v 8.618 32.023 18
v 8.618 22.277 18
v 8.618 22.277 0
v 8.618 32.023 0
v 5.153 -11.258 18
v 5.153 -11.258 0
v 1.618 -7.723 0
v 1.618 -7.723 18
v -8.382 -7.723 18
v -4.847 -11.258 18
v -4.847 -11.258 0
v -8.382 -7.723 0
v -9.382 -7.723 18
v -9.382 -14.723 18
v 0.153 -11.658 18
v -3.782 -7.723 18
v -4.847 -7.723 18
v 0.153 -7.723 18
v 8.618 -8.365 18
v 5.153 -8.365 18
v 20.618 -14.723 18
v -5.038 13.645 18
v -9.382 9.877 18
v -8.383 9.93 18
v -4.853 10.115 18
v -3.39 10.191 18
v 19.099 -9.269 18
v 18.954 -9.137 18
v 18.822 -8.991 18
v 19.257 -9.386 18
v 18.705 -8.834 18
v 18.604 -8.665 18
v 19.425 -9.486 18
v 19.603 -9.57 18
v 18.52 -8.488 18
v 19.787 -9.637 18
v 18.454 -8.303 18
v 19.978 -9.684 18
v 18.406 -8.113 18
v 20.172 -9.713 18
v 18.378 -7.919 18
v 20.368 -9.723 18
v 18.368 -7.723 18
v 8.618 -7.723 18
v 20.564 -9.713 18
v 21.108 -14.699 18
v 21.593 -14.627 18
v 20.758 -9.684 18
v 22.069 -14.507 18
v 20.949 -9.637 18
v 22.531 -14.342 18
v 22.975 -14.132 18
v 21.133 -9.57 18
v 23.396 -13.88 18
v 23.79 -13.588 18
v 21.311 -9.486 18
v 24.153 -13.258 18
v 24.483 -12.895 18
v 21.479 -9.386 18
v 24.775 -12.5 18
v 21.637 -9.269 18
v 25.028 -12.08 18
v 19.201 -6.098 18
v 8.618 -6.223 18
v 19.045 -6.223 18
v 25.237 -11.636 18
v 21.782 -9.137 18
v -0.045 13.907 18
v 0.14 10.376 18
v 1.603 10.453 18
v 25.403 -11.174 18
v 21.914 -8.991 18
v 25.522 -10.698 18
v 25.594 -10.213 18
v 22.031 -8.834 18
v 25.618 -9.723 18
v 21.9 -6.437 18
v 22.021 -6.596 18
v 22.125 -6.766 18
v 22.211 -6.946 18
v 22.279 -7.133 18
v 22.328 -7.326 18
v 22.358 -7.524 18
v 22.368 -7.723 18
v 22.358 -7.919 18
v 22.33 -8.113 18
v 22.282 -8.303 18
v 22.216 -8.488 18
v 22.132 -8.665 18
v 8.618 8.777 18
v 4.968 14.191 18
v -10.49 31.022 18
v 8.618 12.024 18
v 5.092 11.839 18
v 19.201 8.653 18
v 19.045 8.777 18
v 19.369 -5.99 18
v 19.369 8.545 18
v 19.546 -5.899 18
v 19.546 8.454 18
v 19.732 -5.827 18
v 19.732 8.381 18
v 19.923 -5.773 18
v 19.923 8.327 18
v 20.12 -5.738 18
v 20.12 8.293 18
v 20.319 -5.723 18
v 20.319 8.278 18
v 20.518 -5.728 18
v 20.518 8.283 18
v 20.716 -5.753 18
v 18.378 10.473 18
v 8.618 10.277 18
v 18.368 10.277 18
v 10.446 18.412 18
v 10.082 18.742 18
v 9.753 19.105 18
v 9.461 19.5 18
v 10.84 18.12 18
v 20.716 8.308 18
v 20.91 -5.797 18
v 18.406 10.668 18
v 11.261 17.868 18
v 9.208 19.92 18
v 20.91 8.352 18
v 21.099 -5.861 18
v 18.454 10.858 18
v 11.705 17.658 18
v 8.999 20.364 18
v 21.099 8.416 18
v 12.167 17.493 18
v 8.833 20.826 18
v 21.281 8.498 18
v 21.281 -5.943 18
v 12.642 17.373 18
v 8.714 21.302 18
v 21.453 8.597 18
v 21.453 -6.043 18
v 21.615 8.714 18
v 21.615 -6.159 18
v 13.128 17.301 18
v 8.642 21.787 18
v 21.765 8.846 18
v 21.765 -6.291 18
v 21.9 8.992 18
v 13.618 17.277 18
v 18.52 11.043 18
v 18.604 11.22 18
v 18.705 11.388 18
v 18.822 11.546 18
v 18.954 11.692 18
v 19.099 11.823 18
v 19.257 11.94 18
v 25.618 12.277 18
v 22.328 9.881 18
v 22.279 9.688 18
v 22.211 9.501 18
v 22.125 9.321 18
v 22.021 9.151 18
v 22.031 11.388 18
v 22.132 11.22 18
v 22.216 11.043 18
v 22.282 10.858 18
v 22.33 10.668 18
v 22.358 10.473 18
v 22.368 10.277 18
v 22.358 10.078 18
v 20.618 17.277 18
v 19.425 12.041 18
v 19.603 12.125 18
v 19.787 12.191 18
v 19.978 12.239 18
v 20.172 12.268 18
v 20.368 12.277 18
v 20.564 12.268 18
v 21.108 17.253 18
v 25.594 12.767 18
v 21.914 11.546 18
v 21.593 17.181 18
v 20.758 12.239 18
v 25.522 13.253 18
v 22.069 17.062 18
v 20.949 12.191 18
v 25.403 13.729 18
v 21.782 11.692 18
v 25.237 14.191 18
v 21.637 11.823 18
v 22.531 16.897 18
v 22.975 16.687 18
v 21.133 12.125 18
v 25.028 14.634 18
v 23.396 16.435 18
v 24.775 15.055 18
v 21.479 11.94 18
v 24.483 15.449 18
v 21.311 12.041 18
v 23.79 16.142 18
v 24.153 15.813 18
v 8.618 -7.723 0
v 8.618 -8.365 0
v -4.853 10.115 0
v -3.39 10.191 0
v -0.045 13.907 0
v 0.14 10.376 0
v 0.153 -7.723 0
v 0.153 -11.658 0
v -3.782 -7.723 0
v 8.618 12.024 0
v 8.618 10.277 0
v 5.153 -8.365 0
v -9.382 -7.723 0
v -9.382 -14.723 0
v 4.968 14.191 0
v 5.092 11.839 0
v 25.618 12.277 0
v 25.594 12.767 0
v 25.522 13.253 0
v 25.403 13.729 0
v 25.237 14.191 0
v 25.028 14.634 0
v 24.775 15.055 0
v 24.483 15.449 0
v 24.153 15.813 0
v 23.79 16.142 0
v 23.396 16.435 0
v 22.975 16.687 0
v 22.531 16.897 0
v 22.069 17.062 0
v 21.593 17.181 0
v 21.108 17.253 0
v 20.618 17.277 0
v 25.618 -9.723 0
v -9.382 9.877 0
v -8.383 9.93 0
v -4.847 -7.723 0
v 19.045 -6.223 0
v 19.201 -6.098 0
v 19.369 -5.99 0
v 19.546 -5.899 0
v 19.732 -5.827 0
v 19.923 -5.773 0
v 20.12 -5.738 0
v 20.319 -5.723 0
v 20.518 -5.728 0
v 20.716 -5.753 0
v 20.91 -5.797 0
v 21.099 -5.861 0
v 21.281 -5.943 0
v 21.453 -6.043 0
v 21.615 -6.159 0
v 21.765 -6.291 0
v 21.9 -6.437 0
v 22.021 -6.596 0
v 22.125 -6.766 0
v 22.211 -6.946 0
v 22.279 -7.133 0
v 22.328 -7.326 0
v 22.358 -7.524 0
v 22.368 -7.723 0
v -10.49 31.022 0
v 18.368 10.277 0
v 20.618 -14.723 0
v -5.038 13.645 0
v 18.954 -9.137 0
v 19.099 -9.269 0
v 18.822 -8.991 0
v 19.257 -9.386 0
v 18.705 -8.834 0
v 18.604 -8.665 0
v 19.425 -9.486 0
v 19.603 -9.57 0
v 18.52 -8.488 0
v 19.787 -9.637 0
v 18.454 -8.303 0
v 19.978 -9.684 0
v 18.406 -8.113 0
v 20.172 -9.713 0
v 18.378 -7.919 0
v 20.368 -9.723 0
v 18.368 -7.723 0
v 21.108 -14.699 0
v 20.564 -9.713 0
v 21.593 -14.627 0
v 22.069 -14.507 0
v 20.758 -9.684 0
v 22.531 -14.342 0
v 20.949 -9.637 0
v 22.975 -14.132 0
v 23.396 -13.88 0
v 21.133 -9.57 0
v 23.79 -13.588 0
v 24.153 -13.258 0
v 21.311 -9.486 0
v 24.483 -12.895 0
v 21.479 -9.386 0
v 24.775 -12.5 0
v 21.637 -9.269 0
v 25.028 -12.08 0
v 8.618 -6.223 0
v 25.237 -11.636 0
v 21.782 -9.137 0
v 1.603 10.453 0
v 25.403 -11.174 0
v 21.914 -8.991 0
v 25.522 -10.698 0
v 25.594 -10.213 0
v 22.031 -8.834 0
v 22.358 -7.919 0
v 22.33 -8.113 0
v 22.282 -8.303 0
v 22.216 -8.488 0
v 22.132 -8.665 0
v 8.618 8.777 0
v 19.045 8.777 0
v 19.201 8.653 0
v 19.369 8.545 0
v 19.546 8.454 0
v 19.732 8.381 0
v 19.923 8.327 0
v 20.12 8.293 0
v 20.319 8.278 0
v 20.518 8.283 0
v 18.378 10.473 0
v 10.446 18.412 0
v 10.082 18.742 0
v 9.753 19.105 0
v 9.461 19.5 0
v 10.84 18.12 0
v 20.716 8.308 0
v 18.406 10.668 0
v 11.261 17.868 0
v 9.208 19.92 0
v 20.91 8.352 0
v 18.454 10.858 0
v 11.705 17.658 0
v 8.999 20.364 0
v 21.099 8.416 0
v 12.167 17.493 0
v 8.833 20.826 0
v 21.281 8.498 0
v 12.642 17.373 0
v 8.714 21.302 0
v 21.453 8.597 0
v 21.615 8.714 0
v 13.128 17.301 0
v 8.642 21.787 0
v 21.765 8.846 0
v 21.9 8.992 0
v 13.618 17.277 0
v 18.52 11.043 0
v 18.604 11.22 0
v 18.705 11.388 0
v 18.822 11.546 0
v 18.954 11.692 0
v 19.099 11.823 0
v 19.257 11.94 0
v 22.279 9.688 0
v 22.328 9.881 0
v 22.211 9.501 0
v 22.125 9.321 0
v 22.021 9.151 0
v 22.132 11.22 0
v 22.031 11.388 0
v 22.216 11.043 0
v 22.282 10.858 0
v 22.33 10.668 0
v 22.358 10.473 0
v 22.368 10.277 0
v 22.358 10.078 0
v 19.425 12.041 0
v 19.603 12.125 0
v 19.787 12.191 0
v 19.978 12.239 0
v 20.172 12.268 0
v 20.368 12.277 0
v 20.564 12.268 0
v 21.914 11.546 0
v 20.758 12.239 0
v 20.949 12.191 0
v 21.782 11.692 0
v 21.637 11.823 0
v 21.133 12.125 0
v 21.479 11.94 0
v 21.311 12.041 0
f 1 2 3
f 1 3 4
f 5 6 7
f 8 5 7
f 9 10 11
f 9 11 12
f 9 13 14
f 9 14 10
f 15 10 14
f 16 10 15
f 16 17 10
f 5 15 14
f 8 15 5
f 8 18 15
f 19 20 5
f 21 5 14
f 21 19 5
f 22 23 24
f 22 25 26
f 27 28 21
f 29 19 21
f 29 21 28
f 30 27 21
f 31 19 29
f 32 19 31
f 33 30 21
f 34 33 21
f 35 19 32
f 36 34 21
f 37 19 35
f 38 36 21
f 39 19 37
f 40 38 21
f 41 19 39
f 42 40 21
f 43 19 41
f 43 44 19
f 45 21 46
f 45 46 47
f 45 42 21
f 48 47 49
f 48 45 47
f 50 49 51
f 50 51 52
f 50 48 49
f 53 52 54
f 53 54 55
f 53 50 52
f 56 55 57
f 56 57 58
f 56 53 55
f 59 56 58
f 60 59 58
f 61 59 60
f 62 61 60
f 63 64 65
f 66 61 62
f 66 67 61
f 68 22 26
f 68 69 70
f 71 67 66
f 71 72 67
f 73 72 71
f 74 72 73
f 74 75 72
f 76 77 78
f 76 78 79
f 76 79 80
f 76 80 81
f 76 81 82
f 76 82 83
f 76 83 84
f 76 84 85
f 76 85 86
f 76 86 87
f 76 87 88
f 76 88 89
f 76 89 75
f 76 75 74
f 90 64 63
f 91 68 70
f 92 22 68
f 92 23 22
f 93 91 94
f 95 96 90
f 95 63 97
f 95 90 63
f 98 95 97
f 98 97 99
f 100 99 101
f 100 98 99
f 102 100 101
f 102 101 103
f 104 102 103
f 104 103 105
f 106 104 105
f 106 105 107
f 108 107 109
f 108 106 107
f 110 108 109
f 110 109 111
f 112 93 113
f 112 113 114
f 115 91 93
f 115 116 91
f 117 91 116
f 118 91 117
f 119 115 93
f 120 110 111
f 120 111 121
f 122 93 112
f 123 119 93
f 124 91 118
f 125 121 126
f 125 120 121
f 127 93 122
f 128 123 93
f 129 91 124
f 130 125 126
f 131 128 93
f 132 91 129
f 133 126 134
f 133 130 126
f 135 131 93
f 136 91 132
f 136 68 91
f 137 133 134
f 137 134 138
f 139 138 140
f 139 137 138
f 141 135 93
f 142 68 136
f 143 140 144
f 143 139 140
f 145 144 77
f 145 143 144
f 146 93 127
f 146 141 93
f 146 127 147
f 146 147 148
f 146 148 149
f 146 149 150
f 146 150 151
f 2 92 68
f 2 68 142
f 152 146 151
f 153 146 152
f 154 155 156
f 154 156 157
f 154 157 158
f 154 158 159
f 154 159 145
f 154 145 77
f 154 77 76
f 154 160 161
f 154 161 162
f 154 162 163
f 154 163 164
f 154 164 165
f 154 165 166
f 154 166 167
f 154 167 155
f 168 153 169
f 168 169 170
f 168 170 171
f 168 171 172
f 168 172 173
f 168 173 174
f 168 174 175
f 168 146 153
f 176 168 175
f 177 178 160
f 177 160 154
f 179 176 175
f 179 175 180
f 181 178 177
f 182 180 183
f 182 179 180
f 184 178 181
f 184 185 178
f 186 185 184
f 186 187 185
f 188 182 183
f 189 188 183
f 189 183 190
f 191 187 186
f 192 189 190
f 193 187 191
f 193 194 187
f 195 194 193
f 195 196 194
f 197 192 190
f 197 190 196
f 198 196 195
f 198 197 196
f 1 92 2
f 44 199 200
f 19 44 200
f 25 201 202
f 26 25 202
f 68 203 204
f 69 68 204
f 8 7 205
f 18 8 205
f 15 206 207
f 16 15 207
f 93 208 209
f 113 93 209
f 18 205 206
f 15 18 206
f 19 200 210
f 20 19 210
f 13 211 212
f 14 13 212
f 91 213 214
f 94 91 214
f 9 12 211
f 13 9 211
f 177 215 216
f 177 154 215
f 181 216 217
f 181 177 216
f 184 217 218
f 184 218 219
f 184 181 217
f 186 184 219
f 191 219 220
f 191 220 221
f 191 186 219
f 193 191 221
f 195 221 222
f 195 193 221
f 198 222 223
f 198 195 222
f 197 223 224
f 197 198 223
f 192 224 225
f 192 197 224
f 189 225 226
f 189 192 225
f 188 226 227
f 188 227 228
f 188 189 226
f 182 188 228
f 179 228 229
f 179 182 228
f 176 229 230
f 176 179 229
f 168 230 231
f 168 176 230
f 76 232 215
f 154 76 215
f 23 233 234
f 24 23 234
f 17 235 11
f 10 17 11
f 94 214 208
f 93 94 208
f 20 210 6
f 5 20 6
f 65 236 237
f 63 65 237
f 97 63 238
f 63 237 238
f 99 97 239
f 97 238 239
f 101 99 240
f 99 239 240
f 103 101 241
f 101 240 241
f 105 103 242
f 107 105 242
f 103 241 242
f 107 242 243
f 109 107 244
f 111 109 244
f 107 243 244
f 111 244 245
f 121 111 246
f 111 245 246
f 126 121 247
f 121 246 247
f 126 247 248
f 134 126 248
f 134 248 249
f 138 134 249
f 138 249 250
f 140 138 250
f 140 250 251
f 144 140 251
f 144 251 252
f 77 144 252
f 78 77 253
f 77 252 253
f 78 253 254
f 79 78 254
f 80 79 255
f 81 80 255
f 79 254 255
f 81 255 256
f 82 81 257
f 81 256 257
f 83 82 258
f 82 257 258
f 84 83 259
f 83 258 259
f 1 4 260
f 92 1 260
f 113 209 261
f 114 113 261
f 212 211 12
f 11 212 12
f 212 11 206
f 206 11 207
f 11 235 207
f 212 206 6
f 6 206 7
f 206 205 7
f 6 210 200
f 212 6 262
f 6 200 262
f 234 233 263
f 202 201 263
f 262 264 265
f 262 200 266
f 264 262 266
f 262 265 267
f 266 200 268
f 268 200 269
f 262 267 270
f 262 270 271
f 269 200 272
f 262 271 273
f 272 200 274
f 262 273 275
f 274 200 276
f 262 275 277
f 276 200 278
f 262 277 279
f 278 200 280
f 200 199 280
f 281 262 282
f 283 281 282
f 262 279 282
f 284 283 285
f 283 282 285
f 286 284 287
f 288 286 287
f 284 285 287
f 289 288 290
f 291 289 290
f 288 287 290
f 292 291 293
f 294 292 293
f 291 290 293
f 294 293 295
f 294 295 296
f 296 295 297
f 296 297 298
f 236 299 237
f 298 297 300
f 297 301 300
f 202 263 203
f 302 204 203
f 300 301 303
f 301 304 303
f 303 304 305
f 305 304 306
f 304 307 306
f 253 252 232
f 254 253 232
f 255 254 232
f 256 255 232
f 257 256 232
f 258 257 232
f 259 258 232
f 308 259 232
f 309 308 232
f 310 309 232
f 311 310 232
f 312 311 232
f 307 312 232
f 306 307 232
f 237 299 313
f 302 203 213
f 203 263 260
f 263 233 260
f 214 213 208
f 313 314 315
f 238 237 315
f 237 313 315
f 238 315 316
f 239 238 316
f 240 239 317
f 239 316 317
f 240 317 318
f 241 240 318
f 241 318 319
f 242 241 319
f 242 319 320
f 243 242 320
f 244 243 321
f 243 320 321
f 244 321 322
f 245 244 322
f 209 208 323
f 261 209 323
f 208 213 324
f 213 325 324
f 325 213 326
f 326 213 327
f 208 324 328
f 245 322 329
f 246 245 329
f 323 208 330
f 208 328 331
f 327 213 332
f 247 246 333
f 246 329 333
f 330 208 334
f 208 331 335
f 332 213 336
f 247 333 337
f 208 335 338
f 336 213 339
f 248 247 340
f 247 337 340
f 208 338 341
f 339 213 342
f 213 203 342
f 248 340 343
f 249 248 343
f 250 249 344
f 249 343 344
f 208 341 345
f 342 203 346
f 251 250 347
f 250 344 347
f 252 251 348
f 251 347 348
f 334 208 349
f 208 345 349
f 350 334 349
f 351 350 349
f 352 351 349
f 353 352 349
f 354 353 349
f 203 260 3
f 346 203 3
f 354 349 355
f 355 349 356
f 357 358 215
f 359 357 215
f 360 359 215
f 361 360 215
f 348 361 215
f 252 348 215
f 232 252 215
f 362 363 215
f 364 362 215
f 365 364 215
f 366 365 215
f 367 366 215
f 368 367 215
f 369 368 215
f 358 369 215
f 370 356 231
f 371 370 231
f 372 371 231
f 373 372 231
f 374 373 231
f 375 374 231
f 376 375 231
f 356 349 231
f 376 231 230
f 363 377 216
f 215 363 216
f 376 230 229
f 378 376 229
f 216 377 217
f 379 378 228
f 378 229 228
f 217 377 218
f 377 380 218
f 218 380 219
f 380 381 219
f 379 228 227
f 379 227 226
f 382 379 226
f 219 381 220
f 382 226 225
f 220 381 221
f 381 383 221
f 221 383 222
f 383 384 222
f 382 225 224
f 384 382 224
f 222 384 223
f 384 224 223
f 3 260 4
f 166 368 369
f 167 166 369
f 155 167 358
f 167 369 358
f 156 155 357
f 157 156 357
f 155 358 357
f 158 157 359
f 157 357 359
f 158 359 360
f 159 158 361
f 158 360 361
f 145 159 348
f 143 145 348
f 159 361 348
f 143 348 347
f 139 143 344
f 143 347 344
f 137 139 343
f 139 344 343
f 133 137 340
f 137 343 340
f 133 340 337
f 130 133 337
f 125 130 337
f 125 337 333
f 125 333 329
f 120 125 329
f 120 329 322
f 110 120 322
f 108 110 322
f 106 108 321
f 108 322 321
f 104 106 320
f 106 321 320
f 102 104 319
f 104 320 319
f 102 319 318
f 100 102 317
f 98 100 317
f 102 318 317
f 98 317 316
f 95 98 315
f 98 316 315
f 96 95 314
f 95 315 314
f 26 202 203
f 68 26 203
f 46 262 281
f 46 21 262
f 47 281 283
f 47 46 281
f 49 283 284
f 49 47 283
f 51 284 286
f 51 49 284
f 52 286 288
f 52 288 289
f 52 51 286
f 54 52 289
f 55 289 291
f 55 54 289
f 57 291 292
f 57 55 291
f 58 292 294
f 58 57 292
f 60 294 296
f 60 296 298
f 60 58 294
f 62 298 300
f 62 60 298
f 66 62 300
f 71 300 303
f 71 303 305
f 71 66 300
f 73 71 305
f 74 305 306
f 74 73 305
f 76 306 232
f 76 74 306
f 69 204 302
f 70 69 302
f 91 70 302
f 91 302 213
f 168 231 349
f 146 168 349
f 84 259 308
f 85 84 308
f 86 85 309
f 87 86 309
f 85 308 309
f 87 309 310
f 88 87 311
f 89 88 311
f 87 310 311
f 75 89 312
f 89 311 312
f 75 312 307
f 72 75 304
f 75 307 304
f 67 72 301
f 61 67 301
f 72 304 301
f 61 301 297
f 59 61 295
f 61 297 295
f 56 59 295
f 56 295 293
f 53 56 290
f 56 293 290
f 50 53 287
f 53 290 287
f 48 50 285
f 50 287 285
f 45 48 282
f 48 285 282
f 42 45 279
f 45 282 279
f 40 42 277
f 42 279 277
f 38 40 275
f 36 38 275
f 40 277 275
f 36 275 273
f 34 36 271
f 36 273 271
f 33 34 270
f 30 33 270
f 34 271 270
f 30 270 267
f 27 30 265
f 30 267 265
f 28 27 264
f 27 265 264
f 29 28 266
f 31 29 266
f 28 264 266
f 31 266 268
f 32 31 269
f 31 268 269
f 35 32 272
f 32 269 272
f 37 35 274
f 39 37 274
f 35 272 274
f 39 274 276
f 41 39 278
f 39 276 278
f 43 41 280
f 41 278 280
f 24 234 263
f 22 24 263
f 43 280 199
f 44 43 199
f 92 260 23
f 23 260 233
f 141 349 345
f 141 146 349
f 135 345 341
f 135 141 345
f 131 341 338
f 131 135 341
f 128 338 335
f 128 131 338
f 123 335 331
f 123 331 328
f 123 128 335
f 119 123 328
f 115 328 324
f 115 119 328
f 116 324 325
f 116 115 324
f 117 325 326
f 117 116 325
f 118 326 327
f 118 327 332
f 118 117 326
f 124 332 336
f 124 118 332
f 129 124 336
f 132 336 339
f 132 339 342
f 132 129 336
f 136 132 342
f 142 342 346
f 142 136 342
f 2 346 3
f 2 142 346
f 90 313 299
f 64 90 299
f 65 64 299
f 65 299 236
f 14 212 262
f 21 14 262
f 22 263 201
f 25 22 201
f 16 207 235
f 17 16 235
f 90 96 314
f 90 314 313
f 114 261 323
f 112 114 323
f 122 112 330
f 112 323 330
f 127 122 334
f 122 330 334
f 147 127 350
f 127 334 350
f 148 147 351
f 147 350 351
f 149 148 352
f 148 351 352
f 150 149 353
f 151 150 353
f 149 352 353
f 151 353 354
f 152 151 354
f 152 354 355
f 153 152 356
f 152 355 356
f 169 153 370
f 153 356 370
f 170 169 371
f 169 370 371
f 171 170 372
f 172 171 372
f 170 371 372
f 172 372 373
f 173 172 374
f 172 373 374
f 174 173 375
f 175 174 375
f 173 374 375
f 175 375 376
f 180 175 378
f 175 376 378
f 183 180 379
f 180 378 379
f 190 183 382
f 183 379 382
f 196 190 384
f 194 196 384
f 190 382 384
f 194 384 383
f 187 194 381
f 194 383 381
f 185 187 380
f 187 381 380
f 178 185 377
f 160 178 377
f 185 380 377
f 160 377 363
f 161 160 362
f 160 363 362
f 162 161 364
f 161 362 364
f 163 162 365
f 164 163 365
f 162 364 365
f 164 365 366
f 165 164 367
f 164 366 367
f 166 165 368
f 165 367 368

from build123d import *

# Parameters (mm, degrees)
F0_W     = 18
F0_H     = 11
F1_DEPTH = 18
F2_R     = 5


with BuildPart() as f1:
    # F0 (on Top) → F1 (new body)
    with BuildSketch(Plane.XY):
        with Locations((-0.382075, 22.777358)):
            Rectangle(F0_W, F0_H)
        with BuildLine():
            Line((-9.382075, 10.277358), (-9.382075, 9.877358))
            Line((-9.382075, 9.877358), (-8.383446, 9.929694))
            Line((-8.383446, 9.929694), (-5.037793, 13.645418))
            Line((-5.037793, 13.645418), (-4.852757, 10.11473))
            Line((-4.852757, 10.11473), (-3.390298, 10.191374))
            Line((-3.390298, 10.191374), (-0.044645, 13.907098))
            Line((-0.044645, 13.907098), (0.14039, 10.37641))
            Line((0.14039, 10.37641), (1.602849, 10.453054))
            Line((1.602849, 10.453054), (4.968313, 14.190779))
            Line((4.968313, 14.190779), (5.091545, 11.839359))
            Line((5.091545, 11.839359), (8.617925, 12.024169))
            Line((8.617925, 12.024169), (8.617925, 10.820698))
            Line((8.617925, 10.820698), (8.617925, 10.277358))
            Line((8.617925, 10.277358), (18.368002, 10.277358))
            ThreePointArc((18.368002, 10.277358), (20.368002, 12.277358), (22.368002, 10.277358))
            ThreePointArc((22.368002, 10.277358), (21.190878, 8.454483), (19.045127, 8.777358))
            Line((19.045127, 8.777358), (8.617925, 8.777358))
            Line((8.617925, 8.777358), (8.617925, -6.222642))
            Line((8.617925, -6.222642), (19.045127, -6.222642))
            ThreePointArc((19.045127, -6.222642), (21.190878, -5.899766), (22.368002, -7.722642))
            ThreePointArc((22.368002, -7.722642), (20.368002, -9.722642), (18.368002, -7.722642))
            Line((18.368002, -7.722642), (8.617925, -7.722642))
            Line((8.617925, -7.722642), (8.617925, -8.364536))
            Line((8.617925, -8.364536), (5.153458, -8.364536))
            Line((5.153458, -8.364536), (5.153458, -11.258175))
            Line((5.153458, -11.258175), (1.617925, -7.722642))
            Line((1.617925, -7.722642), (0.153458, -7.722642))
            Line((0.153458, -7.722642), (0.153458, -11.658175))
            Line((0.153458, -11.658175), (-3.782075, -7.722642))
            Line((-3.782075, -7.722642), (-4.846542, -7.722642))
            Line((-4.846542, -7.722642), (-4.846542, -11.258175))
            Line((-4.846542, -11.258175), (-8.382075, -7.722642))
            Line((-8.382075, -7.722642), (-9.382075, -7.722642))
            Line((-9.382075, -7.722642), (-9.382075, -14.722642))
            Line((-9.382075, -14.722642), (25.617925, -14.722642))
            Line((25.617925, -14.722642), (25.617925, 17.277358))
            Line((25.617925, 17.277358), (8.617925, 17.277358))
            Line((8.617925, 17.277358), (-9.382075, 17.277358))
            Line((-9.382075, 17.277358), (-9.382075, 10.277358))
        make_face()
        Polygon((-10.490221, 31.022026), (-9.382075, 9.877358), (-9.382075, 10.277358), (-9.382075, 17.277358), (-9.382075, 28.277358), (8.617925, 28.277358), (8.617925, 32.023441), align=None)
    extrude(amount=F1_DEPTH)

    # F2
    f2_edges = [f1.edges().sort_by_distance(p)[0] for p in [
        (8.617925, 17.277358, 9),
        (25.617925, 17.277358, 9),
        (25.617925, -14.722642, 9),
    ]]
    fillet(f2_edges, radius=F2_R)


solid = f1.part
